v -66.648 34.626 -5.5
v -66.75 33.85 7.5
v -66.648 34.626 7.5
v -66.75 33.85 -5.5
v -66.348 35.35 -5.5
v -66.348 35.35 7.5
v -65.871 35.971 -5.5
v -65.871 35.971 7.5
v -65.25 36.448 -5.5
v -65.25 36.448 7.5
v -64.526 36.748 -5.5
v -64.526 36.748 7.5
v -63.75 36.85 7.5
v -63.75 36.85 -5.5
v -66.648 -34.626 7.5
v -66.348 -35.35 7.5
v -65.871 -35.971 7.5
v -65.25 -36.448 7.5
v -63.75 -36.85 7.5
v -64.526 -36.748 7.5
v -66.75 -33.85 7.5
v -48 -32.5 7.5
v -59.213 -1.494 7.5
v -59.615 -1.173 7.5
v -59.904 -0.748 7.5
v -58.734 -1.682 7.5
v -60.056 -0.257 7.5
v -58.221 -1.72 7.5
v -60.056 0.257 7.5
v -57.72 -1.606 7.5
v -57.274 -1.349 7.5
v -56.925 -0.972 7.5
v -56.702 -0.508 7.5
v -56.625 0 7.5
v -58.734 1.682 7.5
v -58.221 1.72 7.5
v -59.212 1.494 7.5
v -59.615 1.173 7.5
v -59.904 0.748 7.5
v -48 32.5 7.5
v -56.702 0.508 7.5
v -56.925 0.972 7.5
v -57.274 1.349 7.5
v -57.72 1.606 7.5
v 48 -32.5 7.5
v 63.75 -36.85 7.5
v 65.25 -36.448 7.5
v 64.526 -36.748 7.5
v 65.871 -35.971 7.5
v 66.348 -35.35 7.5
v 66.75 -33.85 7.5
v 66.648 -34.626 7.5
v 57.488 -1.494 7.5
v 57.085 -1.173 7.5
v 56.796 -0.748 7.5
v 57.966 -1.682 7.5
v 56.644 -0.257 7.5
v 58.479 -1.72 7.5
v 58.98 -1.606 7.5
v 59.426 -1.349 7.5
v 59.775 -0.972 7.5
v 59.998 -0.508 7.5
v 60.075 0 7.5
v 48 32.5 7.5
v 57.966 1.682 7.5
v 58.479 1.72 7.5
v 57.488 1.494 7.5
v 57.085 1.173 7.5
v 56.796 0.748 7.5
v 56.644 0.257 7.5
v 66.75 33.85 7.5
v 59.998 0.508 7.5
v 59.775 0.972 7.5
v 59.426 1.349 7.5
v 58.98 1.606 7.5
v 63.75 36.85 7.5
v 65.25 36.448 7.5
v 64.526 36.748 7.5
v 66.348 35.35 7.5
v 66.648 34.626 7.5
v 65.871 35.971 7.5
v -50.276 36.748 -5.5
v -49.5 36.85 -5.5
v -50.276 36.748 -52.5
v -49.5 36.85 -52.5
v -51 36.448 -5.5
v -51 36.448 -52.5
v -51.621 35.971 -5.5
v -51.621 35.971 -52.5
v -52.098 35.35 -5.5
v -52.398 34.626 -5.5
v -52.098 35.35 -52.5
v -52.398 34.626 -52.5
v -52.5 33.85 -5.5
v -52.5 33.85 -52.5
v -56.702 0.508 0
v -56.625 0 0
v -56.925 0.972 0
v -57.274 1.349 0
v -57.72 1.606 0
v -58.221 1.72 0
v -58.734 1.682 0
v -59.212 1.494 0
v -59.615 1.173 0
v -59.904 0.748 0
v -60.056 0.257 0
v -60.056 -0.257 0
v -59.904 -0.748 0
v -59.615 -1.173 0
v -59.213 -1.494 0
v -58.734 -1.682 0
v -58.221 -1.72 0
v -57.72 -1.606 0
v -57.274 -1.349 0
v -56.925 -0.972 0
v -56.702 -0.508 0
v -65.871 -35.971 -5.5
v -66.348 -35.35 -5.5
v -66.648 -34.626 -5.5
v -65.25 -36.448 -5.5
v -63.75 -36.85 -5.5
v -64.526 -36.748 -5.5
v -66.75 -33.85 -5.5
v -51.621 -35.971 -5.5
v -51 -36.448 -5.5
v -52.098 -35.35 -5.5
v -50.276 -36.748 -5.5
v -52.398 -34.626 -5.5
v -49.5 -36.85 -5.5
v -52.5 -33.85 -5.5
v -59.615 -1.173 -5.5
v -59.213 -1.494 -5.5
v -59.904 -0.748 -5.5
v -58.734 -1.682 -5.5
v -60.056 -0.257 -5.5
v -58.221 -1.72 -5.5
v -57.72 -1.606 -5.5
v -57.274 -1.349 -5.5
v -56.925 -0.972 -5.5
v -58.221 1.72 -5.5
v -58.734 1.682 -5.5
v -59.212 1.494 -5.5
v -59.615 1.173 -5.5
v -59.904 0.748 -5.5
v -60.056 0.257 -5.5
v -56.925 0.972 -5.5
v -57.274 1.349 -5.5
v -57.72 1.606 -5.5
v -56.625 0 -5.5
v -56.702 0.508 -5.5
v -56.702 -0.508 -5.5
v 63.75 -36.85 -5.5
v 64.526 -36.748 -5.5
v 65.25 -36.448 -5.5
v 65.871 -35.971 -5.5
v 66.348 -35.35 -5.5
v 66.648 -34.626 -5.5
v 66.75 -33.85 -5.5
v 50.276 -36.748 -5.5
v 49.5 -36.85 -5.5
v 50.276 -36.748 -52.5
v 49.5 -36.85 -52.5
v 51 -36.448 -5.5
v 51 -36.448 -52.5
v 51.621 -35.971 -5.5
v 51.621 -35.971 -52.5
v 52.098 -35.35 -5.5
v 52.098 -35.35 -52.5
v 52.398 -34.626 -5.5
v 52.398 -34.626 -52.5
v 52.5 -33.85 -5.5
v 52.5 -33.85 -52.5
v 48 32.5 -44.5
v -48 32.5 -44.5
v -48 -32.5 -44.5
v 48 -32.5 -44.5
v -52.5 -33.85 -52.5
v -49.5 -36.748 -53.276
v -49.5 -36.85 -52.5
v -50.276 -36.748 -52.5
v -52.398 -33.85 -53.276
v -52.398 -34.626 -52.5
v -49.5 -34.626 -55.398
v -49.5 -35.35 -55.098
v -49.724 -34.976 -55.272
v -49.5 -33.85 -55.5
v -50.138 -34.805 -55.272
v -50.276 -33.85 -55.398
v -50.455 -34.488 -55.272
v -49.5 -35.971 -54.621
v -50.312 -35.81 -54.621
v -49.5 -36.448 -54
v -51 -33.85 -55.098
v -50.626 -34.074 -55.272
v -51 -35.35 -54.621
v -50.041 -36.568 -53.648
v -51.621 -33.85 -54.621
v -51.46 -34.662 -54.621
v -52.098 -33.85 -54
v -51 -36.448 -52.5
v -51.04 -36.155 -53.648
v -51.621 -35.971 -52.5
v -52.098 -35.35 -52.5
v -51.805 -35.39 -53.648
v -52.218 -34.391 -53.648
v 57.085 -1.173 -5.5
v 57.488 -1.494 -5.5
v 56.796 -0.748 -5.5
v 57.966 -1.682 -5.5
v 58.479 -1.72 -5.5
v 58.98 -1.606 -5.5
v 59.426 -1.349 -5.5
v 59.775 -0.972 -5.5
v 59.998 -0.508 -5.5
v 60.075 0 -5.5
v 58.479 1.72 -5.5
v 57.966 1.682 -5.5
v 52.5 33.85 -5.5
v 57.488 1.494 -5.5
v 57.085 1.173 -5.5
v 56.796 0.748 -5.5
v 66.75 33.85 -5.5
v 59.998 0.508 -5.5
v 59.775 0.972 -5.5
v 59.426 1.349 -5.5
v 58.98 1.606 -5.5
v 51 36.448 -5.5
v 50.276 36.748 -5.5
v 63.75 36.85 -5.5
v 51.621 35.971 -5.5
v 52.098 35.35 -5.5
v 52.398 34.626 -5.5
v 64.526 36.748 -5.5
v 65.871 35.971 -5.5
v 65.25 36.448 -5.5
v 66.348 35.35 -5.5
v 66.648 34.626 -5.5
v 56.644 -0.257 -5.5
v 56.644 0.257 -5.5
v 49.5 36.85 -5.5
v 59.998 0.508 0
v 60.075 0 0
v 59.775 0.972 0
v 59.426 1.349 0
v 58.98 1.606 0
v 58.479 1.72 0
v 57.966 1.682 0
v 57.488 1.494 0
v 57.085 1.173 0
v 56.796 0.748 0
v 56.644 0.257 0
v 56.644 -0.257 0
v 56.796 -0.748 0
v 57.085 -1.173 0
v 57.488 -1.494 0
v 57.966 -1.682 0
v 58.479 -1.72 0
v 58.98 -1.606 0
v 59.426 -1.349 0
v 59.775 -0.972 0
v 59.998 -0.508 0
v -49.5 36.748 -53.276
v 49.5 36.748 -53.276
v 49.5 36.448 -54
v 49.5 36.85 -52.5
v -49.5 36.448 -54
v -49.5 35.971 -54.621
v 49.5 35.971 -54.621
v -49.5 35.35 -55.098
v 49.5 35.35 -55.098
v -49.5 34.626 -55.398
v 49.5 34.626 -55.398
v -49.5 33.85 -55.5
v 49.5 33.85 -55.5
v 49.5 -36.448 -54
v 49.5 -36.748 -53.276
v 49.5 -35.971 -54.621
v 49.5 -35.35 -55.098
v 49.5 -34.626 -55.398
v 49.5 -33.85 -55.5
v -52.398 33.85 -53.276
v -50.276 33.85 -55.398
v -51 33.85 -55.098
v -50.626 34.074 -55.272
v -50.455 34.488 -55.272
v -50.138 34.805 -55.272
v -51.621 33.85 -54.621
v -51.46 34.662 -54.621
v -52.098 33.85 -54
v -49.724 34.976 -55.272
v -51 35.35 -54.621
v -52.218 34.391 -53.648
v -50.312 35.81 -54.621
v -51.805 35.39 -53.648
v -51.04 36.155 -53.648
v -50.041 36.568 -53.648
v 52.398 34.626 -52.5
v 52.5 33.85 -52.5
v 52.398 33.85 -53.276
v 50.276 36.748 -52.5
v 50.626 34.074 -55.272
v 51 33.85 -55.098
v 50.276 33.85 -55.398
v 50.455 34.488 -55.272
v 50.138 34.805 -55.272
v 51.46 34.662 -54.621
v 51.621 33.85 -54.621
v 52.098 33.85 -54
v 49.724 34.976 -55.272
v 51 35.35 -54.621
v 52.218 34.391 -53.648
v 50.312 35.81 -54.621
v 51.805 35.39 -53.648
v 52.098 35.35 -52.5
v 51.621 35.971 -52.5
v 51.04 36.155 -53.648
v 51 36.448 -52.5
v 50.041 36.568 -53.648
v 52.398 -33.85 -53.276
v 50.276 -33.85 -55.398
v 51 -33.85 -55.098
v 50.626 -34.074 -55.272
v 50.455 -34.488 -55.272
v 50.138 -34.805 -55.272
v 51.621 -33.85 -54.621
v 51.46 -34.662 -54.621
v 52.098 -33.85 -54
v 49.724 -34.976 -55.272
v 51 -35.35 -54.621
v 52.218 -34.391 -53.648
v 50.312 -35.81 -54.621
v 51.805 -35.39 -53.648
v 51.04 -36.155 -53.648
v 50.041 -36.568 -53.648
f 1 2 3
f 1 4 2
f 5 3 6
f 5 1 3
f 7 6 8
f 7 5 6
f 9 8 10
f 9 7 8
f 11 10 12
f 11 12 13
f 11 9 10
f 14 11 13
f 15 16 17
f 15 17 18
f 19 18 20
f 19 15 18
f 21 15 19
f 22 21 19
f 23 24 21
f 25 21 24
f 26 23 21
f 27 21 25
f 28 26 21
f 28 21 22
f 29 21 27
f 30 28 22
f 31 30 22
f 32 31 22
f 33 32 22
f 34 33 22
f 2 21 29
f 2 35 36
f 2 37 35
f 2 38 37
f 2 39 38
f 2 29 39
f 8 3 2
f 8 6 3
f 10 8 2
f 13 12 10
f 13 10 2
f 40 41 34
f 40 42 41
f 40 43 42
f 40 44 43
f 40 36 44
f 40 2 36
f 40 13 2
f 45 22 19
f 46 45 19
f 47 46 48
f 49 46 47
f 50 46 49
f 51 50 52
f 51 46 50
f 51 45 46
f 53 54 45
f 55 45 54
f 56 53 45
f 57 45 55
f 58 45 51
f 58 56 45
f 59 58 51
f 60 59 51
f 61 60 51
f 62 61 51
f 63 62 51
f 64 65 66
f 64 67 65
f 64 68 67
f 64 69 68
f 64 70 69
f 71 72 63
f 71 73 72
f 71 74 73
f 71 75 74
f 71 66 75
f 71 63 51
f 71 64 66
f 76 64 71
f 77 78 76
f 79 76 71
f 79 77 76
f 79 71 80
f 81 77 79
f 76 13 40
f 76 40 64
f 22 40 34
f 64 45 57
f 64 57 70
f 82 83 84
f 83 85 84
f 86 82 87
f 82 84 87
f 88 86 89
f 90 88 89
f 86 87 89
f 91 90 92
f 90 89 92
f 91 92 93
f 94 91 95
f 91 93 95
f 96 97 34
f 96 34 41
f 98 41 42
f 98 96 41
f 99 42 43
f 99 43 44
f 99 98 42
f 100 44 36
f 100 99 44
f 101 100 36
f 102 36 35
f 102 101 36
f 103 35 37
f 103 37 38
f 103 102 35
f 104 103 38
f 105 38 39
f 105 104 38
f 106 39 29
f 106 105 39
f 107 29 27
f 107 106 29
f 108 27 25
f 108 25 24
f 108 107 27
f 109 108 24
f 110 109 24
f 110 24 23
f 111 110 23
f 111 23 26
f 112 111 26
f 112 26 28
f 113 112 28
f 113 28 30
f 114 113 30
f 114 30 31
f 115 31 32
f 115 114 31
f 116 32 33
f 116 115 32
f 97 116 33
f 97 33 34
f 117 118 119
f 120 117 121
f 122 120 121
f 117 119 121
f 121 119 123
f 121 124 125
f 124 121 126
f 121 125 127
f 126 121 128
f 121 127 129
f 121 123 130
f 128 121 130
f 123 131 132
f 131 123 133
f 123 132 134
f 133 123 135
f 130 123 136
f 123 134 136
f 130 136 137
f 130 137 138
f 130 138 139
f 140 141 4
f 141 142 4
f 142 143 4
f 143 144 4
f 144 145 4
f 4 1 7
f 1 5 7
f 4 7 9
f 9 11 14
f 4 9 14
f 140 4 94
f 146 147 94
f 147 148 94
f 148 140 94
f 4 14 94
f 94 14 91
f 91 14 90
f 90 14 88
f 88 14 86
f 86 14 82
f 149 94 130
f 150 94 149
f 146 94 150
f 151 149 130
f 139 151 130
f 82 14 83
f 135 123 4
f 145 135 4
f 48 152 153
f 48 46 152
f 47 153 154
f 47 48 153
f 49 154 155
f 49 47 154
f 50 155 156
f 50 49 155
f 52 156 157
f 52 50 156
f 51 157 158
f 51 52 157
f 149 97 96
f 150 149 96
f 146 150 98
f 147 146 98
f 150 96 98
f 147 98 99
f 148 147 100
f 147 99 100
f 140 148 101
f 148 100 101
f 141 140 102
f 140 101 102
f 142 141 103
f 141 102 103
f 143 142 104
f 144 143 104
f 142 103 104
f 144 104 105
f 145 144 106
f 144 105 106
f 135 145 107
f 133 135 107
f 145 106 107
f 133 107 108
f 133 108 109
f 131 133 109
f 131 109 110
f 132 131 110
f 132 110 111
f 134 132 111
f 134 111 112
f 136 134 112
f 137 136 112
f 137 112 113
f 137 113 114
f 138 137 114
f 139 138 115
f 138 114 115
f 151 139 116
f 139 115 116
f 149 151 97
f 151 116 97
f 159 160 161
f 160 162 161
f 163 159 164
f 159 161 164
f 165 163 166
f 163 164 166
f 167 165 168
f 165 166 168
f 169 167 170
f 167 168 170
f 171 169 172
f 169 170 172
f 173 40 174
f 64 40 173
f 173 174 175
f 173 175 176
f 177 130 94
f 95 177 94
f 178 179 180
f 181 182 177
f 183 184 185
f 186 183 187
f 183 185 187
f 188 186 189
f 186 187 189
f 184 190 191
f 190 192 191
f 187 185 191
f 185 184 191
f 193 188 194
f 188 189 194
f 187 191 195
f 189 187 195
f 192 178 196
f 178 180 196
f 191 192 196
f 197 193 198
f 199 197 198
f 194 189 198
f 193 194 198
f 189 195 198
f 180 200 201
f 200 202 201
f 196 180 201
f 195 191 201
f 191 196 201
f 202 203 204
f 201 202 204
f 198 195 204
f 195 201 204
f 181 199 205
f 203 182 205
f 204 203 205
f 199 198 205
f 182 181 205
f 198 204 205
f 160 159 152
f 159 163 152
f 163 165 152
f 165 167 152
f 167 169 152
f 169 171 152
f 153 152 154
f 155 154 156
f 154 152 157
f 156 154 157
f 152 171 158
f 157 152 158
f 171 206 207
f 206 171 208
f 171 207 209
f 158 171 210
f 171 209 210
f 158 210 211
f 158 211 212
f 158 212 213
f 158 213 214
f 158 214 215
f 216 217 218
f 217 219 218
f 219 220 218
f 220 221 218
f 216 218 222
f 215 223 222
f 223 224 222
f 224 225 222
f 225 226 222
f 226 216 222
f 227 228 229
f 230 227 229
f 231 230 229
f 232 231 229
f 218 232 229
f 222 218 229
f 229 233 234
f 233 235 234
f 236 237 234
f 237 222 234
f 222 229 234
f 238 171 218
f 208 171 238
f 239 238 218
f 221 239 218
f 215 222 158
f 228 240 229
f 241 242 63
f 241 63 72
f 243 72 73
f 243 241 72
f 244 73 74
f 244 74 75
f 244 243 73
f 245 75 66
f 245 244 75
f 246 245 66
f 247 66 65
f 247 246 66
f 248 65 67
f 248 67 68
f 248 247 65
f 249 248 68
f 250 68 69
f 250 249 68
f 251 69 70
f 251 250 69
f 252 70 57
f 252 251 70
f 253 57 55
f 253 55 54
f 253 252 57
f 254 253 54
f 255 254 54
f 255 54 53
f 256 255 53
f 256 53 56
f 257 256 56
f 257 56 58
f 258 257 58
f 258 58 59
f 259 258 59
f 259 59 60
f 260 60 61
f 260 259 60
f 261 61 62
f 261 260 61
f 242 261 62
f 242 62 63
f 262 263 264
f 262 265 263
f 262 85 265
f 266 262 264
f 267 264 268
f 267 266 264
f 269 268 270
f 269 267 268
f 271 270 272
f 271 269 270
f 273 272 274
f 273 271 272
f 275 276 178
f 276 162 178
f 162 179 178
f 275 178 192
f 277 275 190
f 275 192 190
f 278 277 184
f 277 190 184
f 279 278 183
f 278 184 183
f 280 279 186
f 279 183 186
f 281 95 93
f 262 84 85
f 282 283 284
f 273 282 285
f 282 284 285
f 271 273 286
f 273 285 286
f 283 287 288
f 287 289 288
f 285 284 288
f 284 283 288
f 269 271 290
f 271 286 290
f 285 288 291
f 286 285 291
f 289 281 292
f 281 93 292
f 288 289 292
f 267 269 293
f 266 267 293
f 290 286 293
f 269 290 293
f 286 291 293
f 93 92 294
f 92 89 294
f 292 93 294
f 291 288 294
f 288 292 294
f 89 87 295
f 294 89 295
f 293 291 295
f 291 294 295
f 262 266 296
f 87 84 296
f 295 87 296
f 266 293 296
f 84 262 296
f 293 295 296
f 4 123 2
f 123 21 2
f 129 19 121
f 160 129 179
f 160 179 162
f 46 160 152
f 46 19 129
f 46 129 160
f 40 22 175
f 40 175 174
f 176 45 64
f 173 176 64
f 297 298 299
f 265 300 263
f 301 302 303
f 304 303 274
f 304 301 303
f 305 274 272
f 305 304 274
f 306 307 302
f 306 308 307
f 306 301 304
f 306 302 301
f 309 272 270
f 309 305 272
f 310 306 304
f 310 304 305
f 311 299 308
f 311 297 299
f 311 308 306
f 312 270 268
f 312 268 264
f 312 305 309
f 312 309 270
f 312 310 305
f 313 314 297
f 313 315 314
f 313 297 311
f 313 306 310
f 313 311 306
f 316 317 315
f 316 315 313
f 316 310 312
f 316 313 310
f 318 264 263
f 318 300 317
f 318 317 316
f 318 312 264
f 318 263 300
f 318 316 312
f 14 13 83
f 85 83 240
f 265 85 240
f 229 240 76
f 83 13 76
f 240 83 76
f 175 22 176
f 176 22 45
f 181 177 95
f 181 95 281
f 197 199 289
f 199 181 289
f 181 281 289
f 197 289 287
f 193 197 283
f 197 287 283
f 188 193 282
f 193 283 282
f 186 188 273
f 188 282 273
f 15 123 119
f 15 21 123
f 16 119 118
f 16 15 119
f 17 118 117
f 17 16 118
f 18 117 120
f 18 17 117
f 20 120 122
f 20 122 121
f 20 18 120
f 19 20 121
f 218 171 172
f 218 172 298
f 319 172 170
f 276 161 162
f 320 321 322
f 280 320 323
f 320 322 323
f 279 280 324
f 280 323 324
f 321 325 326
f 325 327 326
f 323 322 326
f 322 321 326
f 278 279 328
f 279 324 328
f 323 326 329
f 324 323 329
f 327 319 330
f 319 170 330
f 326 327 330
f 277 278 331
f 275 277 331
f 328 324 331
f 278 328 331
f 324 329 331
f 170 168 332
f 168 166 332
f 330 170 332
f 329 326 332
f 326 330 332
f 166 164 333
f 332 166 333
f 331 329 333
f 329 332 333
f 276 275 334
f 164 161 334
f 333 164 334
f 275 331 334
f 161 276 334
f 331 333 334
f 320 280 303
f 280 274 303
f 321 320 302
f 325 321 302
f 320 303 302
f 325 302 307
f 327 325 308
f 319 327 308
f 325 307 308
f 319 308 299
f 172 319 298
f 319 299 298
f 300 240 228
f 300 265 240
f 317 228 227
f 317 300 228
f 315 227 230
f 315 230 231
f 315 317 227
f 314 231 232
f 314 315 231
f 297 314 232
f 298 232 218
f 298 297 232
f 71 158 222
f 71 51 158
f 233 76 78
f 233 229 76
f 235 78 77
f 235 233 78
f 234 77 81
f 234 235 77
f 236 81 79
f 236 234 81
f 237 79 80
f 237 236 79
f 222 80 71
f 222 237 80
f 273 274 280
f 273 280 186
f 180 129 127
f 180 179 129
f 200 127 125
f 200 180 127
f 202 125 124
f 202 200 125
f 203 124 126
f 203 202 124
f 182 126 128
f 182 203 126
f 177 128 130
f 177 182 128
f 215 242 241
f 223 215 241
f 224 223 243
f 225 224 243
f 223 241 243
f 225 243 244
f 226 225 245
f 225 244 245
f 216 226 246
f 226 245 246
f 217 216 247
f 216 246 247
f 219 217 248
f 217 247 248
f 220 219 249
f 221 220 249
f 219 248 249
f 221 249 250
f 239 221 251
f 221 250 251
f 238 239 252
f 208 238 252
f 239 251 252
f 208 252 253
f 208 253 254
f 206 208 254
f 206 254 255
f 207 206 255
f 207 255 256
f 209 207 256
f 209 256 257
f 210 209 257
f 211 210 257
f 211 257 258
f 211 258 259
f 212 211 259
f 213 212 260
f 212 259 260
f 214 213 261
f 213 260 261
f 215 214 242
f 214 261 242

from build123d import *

# Parameters (mm, degrees)
SKETCH1_W                = 133.5
SKETCH1_H                = 73.7
SKETCH1_R                = 1.725
BOSS_EXTRUDE1_DEPTH      = 7.5
BOSS_EXTRUDE1_DEPTH_BACK = 5.5
SKETCH2_W                = 105
SKETCH2_H                = 73.7
BOSS_EXTRUDE2_DEPTH      = 50
SKETCH6_W                = 96
SKETCH6_H                = 65
CUT_EXTRUDE3_DEPTH       = 52
FILLET5_R                = 3
FILLET6_R                = 3


with BuildPart() as part:
    # Sketch1 → Boss-Extrude1 (new body, two sides)
    with BuildSketch(Plane.XY) as boss_extrude1_sk:
        Rectangle(SKETCH1_W, SKETCH1_H)
        with Locations((-58.35, 0)):
            Circle(SKETCH1_R, mode=Mode.SUBTRACT)
        with Locations((58.35, 0)):
            Circle(SKETCH1_R, mode=Mode.SUBTRACT)
    extrude(amount=BOSS_EXTRUDE1_DEPTH)
    extrude(boss_extrude1_sk.sketch, amount=-BOSS_EXTRUDE1_DEPTH_BACK)

    # Sketch2 → Boss-Extrude2 (add)
    with BuildSketch(Plane(origin=(0, 0, -5.5), x_dir=(-1, 0, 0), z_dir=(0, 0, -1))):
        Rectangle(SKETCH2_W, SKETCH2_H)
    extrude(amount=BOSS_EXTRUDE2_DEPTH)

    # Sketch6 → Cut-Extrude3 (cut)
    with BuildSketch(Plane.XY.offset(7.5)):
        Rectangle(SKETCH6_W, SKETCH6_H)
    extrude(amount=-CUT_EXTRUDE3_DEPTH, mode=Mode.SUBTRACT)

    # Fillet5
    fillet5_edges = [part.edges().sort_by_distance(p)[0] for p in [
        (-66.75, 36.85, 1),
        (66.75, 36.85, 1),
        (66.75, -36.85, 1),
        (-66.75, -36.85, 1),
    ]]
    fillet(fillet5_edges, radius=FILLET5_R)

    # Fillet6
    fillet6_edges = [part.edges().sort_by_distance(p)[0] for p in [
        (52.5, 36.85, -30.5),
        (52.5, -36.85, -30.5),
        (-52.5, -36.85, -30.5),
        (-52.5, 36.85, -30.5),
        (52.5, 0, -55.5),
        (0, -36.85, -55.5),
        (-52.5, 0, -55.5),
        (0, 36.85, -55.5),
    ]]
    fillet(fillet6_edges, radius=FILLET6_R)


solid = part.part
